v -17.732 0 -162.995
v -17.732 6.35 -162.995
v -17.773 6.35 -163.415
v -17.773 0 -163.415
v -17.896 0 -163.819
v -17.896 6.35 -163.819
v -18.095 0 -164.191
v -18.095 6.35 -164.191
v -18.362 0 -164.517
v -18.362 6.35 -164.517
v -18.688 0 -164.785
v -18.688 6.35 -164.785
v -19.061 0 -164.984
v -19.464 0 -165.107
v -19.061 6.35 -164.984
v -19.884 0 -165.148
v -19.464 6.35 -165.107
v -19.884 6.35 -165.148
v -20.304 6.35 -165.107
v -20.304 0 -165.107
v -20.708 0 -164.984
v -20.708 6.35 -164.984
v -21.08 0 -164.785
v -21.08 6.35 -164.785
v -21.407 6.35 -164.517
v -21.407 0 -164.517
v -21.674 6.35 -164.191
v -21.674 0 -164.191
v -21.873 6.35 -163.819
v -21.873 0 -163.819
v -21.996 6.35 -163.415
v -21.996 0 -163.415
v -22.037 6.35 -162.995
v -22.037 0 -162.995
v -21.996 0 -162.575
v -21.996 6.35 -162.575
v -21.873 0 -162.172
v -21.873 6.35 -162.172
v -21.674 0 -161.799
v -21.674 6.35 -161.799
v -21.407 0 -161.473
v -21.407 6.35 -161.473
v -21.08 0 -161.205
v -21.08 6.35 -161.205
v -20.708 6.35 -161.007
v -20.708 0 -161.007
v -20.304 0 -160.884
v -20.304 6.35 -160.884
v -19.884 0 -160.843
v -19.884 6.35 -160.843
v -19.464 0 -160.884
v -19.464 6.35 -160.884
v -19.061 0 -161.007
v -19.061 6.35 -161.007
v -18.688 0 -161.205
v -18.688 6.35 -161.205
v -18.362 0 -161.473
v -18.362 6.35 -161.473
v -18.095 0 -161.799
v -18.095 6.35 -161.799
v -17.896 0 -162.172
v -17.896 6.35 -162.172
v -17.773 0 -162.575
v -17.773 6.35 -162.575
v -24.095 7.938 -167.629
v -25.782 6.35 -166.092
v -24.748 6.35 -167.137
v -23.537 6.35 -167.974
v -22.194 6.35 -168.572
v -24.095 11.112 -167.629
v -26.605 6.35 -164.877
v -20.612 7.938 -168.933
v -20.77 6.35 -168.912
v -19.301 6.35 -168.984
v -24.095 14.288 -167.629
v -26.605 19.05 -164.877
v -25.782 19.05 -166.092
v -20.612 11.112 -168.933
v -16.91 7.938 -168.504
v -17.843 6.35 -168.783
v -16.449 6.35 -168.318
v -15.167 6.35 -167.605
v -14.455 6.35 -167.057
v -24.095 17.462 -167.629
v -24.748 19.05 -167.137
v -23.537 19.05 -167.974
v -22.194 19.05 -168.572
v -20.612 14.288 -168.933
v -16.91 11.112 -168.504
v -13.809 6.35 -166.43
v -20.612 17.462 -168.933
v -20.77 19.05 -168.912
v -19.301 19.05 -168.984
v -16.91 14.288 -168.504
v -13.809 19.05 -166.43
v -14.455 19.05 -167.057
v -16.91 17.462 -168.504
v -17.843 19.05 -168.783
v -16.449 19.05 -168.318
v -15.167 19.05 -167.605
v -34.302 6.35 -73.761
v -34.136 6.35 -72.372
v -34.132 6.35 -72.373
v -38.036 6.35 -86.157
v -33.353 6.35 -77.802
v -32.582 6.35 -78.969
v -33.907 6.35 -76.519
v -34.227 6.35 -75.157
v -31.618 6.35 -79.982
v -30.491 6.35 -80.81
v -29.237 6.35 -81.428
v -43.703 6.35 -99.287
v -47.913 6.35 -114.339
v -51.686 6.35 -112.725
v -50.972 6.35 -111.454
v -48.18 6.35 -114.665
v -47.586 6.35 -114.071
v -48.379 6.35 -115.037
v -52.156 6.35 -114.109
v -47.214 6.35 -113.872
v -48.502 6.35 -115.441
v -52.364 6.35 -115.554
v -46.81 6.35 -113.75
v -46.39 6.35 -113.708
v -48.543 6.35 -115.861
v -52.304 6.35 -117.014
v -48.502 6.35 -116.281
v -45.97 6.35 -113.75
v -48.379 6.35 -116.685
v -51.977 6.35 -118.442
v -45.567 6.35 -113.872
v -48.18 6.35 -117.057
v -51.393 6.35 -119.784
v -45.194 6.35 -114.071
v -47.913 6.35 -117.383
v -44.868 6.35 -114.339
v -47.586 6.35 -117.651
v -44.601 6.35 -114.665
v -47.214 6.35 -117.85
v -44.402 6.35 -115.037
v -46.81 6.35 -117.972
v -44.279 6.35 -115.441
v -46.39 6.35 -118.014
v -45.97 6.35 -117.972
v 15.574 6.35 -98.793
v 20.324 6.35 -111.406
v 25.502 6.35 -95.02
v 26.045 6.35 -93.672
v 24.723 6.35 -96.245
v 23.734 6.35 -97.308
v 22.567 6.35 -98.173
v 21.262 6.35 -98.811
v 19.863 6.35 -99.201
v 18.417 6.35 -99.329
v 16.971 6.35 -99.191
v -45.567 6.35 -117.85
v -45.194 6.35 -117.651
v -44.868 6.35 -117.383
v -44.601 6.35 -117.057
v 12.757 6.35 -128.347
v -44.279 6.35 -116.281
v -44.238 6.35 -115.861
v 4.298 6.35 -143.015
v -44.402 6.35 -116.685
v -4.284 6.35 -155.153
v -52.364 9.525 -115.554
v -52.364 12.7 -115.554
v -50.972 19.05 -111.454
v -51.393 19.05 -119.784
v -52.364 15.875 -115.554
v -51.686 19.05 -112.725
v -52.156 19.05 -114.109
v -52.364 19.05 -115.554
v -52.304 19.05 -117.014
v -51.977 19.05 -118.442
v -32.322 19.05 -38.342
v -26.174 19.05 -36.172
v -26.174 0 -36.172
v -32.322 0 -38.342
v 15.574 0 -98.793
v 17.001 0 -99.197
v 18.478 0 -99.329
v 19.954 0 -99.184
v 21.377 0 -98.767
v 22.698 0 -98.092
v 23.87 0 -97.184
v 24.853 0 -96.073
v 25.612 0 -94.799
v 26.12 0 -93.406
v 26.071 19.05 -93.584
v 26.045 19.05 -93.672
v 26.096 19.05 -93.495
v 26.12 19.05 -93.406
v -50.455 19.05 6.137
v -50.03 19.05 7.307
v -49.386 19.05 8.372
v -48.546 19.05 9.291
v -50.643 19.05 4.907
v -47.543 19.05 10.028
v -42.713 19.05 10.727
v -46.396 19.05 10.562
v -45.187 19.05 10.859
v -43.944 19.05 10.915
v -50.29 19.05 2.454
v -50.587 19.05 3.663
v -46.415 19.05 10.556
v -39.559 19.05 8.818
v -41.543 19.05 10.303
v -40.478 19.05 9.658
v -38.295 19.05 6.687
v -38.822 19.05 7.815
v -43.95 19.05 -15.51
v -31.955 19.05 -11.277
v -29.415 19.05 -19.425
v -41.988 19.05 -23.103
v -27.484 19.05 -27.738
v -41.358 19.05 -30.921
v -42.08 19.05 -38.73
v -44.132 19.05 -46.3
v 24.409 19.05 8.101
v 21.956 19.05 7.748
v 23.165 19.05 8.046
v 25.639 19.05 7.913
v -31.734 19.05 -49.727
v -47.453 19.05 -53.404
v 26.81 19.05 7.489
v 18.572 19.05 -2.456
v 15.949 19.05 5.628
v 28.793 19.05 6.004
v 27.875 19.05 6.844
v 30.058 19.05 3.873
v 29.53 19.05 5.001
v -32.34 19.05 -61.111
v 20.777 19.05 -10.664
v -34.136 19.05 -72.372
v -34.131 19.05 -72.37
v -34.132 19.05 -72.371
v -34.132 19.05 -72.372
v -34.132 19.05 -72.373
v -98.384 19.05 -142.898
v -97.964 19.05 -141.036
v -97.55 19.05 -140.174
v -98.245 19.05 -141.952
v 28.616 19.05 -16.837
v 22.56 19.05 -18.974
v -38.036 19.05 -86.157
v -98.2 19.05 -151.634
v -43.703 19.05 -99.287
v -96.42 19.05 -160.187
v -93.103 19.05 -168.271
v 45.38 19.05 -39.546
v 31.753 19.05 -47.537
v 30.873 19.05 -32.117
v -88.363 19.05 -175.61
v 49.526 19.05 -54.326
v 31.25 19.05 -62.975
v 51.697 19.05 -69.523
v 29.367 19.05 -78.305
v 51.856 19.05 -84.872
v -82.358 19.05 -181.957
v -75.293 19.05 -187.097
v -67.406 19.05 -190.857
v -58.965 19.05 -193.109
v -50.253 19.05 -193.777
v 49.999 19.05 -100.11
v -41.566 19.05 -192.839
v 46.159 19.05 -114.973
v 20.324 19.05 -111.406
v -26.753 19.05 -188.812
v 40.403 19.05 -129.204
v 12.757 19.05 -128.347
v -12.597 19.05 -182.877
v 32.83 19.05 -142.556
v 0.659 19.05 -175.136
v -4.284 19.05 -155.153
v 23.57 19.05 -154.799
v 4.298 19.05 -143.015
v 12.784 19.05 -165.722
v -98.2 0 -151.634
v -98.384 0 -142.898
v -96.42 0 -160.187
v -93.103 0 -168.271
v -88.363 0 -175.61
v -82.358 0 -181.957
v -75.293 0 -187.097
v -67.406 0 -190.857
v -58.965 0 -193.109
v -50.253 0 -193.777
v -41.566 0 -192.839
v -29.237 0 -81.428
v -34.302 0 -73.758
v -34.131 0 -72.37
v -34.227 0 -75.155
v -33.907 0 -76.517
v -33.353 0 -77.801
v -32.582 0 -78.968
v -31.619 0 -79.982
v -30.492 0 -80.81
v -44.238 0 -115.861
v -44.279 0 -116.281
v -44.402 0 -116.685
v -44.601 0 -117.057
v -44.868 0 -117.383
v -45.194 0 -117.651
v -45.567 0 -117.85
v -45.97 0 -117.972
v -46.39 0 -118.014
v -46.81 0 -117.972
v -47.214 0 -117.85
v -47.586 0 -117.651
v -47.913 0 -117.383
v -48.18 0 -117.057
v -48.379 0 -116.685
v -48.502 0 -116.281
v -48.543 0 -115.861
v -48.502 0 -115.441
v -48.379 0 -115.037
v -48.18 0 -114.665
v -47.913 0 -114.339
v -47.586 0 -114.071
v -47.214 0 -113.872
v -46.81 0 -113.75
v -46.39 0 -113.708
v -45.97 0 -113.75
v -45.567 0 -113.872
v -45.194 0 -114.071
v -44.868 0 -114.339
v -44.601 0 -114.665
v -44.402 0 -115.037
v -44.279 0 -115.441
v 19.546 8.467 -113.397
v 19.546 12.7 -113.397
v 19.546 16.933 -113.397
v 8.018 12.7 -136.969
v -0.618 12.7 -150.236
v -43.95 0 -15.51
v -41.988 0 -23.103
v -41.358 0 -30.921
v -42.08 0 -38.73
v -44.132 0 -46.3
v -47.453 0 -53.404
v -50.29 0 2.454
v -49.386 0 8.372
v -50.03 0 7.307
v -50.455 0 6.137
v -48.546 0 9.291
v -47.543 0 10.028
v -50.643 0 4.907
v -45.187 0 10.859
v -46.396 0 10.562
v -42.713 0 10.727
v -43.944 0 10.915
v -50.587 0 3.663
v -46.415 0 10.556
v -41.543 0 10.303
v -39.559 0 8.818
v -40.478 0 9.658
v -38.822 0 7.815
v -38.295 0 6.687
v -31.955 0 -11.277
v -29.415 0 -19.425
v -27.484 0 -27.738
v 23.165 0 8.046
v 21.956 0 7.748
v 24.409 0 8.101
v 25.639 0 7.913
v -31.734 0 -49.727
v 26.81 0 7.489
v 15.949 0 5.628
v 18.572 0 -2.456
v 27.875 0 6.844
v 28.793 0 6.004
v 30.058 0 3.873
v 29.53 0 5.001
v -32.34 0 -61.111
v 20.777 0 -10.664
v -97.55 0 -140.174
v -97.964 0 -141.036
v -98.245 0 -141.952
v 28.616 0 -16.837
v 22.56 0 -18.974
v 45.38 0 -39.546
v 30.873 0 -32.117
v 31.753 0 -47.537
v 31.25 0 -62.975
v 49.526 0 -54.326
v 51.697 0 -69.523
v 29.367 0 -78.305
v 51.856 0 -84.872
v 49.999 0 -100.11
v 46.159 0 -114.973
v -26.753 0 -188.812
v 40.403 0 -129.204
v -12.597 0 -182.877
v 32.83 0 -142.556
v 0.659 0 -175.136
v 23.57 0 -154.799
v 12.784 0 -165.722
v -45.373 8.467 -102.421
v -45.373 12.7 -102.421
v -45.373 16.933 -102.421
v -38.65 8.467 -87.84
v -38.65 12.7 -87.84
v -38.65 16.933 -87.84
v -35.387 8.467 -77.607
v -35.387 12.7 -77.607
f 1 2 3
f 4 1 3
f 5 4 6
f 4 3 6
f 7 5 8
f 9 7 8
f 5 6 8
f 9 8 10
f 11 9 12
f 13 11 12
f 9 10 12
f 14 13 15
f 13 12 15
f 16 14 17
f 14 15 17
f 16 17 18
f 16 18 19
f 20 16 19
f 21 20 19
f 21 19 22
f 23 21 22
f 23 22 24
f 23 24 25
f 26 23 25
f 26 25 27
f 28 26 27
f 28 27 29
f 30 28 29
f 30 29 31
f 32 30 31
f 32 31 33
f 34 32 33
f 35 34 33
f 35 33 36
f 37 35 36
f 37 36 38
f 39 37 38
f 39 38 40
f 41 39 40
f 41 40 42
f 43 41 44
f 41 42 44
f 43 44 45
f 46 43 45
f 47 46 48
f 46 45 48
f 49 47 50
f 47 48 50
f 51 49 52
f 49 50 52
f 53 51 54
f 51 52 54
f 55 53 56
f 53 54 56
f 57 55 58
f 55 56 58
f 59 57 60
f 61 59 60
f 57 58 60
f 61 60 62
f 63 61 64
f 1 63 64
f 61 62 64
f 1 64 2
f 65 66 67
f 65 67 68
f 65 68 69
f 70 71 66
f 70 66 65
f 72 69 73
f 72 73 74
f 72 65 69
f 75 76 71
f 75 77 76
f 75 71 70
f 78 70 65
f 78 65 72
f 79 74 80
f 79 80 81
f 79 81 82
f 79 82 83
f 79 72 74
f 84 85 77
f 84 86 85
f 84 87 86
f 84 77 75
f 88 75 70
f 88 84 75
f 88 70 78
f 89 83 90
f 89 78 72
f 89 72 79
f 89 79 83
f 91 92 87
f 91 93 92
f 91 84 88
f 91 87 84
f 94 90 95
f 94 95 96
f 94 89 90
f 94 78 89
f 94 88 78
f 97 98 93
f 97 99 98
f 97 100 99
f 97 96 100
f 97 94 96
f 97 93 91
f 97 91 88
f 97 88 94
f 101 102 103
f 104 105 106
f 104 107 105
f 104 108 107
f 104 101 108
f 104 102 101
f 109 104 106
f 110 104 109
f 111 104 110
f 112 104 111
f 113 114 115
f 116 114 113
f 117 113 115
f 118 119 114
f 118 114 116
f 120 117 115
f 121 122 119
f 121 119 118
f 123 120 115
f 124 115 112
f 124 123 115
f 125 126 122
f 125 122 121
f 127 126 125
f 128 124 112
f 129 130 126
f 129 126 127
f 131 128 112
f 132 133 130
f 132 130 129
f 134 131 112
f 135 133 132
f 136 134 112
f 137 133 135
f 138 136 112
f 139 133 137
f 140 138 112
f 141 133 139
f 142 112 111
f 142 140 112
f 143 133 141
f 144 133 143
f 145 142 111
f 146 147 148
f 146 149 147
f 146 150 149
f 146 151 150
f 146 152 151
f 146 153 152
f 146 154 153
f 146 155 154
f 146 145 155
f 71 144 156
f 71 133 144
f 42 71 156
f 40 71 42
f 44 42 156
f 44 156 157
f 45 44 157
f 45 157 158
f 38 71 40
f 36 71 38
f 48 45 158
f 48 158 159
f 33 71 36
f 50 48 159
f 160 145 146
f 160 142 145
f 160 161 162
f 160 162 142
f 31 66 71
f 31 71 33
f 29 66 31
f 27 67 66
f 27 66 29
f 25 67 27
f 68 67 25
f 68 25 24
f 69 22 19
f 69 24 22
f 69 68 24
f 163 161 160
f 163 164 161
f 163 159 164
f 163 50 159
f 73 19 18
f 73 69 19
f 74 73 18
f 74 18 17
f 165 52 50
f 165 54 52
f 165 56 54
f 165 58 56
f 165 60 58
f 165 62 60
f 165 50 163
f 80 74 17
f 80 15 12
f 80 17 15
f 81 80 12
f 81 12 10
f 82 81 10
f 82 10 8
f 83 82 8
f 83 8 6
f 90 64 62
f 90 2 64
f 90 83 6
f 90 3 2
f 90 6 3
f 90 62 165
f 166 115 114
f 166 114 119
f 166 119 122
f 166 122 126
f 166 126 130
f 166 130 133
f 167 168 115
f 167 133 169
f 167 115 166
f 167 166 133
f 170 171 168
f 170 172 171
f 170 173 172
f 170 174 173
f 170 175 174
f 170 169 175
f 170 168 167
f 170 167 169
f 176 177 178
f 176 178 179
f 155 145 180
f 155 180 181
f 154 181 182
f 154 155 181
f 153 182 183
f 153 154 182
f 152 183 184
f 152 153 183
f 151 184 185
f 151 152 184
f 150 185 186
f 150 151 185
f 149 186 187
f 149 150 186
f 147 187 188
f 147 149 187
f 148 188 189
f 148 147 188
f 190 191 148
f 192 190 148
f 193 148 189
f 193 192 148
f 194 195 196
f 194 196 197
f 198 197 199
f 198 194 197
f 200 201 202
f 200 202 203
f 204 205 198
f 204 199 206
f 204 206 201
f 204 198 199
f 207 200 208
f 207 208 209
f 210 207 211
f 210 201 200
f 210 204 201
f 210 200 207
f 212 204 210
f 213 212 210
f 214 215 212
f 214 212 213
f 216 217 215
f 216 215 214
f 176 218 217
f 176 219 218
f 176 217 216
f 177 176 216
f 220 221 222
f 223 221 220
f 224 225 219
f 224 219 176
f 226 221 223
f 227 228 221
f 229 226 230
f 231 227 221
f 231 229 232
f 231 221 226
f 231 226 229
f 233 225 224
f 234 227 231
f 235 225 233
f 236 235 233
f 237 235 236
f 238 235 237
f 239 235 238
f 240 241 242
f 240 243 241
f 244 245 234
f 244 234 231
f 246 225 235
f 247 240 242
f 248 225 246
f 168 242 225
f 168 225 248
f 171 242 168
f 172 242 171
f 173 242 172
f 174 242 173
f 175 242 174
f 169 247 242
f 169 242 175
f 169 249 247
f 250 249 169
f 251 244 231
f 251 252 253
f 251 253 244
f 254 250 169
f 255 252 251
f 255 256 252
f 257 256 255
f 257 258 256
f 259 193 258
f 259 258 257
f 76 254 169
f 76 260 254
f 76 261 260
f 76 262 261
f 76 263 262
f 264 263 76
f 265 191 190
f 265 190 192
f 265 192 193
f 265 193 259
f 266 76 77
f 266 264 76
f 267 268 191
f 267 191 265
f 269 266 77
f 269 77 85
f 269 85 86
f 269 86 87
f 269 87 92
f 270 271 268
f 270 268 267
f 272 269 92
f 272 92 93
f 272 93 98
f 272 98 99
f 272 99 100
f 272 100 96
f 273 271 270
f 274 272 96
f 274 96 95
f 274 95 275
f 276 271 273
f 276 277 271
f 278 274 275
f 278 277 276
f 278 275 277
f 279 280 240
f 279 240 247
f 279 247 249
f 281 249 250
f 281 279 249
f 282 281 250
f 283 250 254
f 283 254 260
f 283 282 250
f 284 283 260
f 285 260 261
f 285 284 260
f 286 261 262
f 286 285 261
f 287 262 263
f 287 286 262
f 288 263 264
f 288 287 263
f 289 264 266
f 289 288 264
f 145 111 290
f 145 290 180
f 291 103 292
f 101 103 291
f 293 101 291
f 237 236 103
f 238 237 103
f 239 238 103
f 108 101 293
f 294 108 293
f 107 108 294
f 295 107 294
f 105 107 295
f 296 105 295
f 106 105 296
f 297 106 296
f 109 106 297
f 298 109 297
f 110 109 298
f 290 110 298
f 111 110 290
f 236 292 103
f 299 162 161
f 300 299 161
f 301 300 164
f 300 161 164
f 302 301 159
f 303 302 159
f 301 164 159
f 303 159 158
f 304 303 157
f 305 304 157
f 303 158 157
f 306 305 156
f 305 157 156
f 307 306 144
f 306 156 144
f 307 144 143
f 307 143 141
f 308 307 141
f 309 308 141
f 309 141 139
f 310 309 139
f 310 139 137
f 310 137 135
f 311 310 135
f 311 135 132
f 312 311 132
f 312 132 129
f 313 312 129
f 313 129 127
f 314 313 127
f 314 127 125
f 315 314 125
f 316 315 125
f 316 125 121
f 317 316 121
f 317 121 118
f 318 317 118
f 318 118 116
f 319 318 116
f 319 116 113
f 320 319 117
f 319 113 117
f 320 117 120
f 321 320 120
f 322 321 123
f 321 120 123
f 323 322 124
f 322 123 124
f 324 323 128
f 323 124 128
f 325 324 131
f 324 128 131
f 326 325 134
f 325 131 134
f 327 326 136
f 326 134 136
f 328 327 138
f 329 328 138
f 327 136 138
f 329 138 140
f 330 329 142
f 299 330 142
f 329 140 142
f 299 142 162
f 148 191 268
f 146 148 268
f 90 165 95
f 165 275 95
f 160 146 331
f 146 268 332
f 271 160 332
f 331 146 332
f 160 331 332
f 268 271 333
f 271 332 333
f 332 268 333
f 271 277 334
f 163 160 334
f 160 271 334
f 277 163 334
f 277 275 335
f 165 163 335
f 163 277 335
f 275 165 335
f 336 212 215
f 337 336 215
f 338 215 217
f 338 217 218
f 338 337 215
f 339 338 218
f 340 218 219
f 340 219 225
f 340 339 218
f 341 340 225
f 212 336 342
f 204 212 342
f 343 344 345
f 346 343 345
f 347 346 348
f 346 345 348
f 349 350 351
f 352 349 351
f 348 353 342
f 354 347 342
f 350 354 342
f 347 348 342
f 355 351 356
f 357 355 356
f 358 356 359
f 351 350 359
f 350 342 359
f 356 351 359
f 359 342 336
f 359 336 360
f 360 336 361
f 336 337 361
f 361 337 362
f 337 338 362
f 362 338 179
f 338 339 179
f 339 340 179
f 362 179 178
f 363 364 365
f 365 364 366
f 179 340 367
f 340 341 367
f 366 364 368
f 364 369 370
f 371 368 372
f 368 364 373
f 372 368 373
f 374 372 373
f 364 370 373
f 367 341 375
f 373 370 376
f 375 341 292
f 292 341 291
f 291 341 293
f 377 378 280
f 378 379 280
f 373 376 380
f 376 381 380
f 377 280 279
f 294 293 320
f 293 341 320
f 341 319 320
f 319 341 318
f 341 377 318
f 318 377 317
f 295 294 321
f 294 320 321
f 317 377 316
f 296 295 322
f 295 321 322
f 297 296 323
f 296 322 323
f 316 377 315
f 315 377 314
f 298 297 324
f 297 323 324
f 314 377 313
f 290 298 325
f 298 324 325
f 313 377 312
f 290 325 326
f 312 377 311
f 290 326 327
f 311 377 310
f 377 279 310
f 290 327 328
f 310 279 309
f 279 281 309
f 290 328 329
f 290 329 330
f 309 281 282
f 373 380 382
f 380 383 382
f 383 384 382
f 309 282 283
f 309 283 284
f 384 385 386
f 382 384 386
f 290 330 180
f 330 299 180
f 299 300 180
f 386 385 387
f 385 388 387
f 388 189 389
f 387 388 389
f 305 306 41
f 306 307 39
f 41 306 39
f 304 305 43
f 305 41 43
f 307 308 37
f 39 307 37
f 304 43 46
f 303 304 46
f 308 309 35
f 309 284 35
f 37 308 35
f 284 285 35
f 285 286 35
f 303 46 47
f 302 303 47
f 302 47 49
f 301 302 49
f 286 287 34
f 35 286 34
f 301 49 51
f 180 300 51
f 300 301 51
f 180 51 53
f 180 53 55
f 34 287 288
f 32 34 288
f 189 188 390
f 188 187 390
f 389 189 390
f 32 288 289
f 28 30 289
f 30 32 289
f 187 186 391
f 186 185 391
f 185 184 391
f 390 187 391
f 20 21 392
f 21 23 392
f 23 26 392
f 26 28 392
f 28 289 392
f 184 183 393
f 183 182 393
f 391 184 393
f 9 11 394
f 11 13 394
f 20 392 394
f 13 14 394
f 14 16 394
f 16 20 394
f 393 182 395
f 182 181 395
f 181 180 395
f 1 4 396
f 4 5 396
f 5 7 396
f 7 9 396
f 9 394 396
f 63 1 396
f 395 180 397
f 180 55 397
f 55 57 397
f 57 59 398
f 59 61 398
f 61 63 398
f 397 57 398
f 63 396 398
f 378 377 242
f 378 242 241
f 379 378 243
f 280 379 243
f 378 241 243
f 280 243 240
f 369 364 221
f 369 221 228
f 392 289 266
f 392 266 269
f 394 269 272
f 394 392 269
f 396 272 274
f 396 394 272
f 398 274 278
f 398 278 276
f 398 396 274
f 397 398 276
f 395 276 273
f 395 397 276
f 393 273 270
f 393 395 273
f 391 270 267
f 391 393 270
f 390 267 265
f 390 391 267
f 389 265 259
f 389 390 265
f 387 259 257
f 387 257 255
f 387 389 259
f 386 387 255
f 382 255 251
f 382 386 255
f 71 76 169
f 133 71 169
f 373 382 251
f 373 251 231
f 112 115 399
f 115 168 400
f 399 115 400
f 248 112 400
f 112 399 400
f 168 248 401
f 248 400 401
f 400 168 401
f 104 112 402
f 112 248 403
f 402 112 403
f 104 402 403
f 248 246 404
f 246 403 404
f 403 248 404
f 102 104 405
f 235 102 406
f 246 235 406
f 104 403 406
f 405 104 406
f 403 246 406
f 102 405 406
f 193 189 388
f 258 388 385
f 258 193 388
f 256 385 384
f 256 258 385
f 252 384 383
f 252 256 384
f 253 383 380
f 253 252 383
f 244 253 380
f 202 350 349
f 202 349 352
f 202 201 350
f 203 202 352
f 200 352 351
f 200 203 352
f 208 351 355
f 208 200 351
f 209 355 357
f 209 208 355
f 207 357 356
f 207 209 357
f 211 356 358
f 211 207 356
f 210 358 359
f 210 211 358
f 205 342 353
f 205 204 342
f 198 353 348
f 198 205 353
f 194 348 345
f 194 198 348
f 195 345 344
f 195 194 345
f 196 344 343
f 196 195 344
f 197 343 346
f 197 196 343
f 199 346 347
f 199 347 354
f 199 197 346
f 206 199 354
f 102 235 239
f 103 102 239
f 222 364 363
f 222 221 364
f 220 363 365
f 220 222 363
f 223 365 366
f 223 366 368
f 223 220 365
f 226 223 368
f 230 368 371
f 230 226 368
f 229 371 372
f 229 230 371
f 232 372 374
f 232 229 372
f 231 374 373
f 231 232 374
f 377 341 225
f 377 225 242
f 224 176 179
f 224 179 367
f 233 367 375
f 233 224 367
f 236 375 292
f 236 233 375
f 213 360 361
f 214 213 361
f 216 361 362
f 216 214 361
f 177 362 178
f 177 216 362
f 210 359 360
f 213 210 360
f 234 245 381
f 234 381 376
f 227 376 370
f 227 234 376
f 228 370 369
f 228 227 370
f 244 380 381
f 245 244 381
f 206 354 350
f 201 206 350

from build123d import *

# Parameters (mm, degrees)
BOSS_EXTRUDE1_DEPTH   = 19.05
CUT_EXTRUDE1_DEPTH    = 219.215212878
CUT_EXTRUDE2_DEPTH    = 12.7
BOSS_EXTRUDE2_DEPTH   = 19.05
FILLET1_R             = 6.35
F_8_CLEARANCE_HOLE1_D = 4.3053


with BuildPart() as part:
    # Sketch1 → Boss-Extrude1 (new body)
    with BuildSketch(Plane(origin=(0, 0, 0), x_dir=(1, 0, 0), z_dir=(0, 1, 0))):
        with BuildLine():
            Line((-47.453228006, 53.404284402), (-98.253228006, 141.392465427))
            ThreePointArc((-98.253228006, 141.392465427), (-82.921975522, 181.453316928), (-41.566473575, 192.839342769))
            ThreePointArc((-41.566473575, 192.839342769), (36.836225704, 136.004392842), (45.380299153, 39.546144899))
            Line((45.380299153, 39.546144899), (27.944541838, -9.861512816))
            Line((27.944541838, -9.861512816), (0, 0))
            Line((0, 0), (-43.950457827, 15.509934128))
            ThreePointArc((-43.950457827, 15.509934128), (-41.550098289, 34.840876427), (-47.453228006, 53.404284402))
        make_face()
    extrude(amount=BOSS_EXTRUDE1_DEPTH)

    # Sketch5 → Cut-Extrude1 (cut, through all)
    with BuildSketch(Plane(origin=(0, 19.05, 0), x_dir=(1, 0, 0), z_dir=(0, 1, 0))):
        with BuildLine():
            Line((-29.23664893, 81.427581144), (15.574383155, 98.792652007))
            ThreePointArc((15.574383155, 98.792652007), (22.053436092, 98.460407789), (26.120098061, 93.405630482))
            ThreePointArc((26.120098061, 93.405630482), (31.67419382, 55.261505814), (28.616328902, 16.836622098))
            Line((28.616328902, 16.836622098), (22.559524164, 18.974043348))
            ThreePointArc((22.559524164, 18.974043348), (19.726825076, 6.545871538), (15.949337201, -5.628454892))
            Line((15.949337201, -5.628454892), (-31.95525319, 11.276876204))
            ThreePointArc((-31.95525319, 11.276876204), (-28.372538305, 23.563648828), (-26.173781301, 36.171824553))
            Line((-26.173781301, 36.171824553), (-32.322028113, 38.341515332))
            ThreePointArc((-32.322028113, 38.341515332), (-31.887912186, 55.427050363), (-34.131380562, 72.370214577))
            ThreePointArc((-34.131380562, 72.370214577), (-33.353370645, 77.801041885), (-29.23664893, 81.427581144))
        make_face()
    extrude(amount=-CUT_EXTRUDE1_DEPTH, mode=Mode.SUBTRACT)

    # Sketch6 → Cut-Extrude2 (cut)
    with BuildSketch(Plane(origin=(0, 19.05, 0), x_dir=(1, 0, 0), z_dir=(0, 1, 0))):
        with BuildLine():
            Line((-34.136031583, 72.371811773), (26.116293886, 93.401758977))
            add(Edge.make_bspline(
                [(26.116293886, 93.401758977), (24.324889601, 100.23803776), (22.130168151, 106.901258397), (16.96212823, 119.893613822), (13.988046064, 126.222420918), (9.776956475, 133.921680991), (8.910007749, 135.450921337), (7.126151123, 138.487965199), (6.207974968, 139.997768114), (3.386426272, 144.480432789), (1.42392697, 147.394611788), (-4.701484626, 155.920269738), (-9.100754748, 161.316287945), (-13.809441186, 166.430246232)],
                knots=[0, 0, 0, 0, 0.25, 0.25, 0.5, 0.5, 0.5625, 0.5625, 0.625, 0.625, 0.75, 0.75, 1, 1, 1, 1], degree=3))
            add(Edge.make_bspline(
                [(-26.604572492, 164.8773905), (-26.150591479, 165.703254328), (-25.515446259, 166.400295605), (-24.879031904, 167.098729697), (-24.095373437, 167.628794259), (-23.313760397, 168.1574753), (-22.428907317, 168.488425961), (-21.547481327, 168.818094831), (-20.612298709, 168.932538075), (-19.674896196, 169.047252981), (-18.735576663, 168.938540794), (-17.797334242, 168.829953267), (-16.909699728, 168.503685222), (-16.026331795, 168.178985445), (-15.242553256, 167.655985099), (-14.452846951, 167.129029268), (-13.809441186, 166.430246232)],
                knots=[0, 0, 0, 0.125, 0.125, 0.25, 0.25, 0.375, 0.375, 0.5, 0.5, 0.625, 0.625, 0.75, 0.75, 0.875, 0.875, 1, 1, 1], degree=2))
            Line((-26.604572492, 164.8773905), (-51.39264493, 119.783935416))
            add(Edge.make_bspline(
                [(-50.971516495, 111.453693883), (-51.597295758, 112.361285599), (-51.952278538, 113.405618938), (-52.307499269, 114.450652309), (-52.364051333, 115.554155451), (-52.420577964, 116.657162304), (-52.173441916, 117.734834771), (-51.926064332, 118.813560494), (-51.39264493, 119.783935416)],
                knots=[0, 0, 0, 0.25, 0.25, 0.5, 0.5, 0.75, 0.75, 1, 1, 1], degree=2))
            add(Edge.make_bspline(
                [(-50.971516495, 111.453693883), (-48.958817602, 108.534599247), (-47.092599274, 105.523689489), (-43.653878745, 99.317766492), (-42.08164257, 96.122586505), (-39.950407344, 91.187456603), (-39.27814351, 89.518531936), (-38.021441634, 86.160956199), (-37.435479748, 84.468826365), (-36.34793939, 81.058006993), (-35.846327383, 79.339328012), (-34.927561091, 75.875386956), (-34.510190541, 74.129079907), (-34.136031583, 72.371811773)],
                knots=[0, 0, 0, 0, 0.25, 0.25, 0.5, 0.5, 0.625, 0.625, 0.75, 0.75, 0.875, 0.875, 1, 1, 1, 1], degree=3))
        make_face()
    extrude(amount=-CUT_EXTRUDE2_DEPTH, mode=Mode.SUBTRACT)

    # Sketch7 → Boss-Extrude2 (add)
    with BuildSketch(Plane(origin=(0, 0, 0), x_dir=(1, 0, 0), z_dir=(0, 1, 0))):
        Polygon((-43.950457827, 15.509934128), (-52.403123375, -8.442361068), (-40.408086707, -12.675359716), (-31.95525319, 11.276876204), align=None)
    extrude(amount=BOSS_EXTRUDE2_DEPTH)

    # Fillet1
    fillet1_edges = [part.edges().sort_by_distance(p)[0] for p in [
        (-98.253228006, 9.525, -141.392465427),
        (27.944541838, 9.525, 9.861512816),
        (-52.403123375, 9.525, 8.442361068),
        (-40.408086707, 9.525, 12.675359716),
    ]]
    fillet(fillet1_edges, radius=FILLET1_R)

    # #8 Clearance Hole1 (through all)
    with Locations(Plane(origin=(0, 0, 0), x_dir=(-1, 0, 0), z_dir=(0, -1, 0))):
        with Locations((46.39038303, 115.861048868), (19.884364695, 162.99531268)):
            Hole(F_8_CLEARANCE_HOLE1_D / 2)


solid = part.part
